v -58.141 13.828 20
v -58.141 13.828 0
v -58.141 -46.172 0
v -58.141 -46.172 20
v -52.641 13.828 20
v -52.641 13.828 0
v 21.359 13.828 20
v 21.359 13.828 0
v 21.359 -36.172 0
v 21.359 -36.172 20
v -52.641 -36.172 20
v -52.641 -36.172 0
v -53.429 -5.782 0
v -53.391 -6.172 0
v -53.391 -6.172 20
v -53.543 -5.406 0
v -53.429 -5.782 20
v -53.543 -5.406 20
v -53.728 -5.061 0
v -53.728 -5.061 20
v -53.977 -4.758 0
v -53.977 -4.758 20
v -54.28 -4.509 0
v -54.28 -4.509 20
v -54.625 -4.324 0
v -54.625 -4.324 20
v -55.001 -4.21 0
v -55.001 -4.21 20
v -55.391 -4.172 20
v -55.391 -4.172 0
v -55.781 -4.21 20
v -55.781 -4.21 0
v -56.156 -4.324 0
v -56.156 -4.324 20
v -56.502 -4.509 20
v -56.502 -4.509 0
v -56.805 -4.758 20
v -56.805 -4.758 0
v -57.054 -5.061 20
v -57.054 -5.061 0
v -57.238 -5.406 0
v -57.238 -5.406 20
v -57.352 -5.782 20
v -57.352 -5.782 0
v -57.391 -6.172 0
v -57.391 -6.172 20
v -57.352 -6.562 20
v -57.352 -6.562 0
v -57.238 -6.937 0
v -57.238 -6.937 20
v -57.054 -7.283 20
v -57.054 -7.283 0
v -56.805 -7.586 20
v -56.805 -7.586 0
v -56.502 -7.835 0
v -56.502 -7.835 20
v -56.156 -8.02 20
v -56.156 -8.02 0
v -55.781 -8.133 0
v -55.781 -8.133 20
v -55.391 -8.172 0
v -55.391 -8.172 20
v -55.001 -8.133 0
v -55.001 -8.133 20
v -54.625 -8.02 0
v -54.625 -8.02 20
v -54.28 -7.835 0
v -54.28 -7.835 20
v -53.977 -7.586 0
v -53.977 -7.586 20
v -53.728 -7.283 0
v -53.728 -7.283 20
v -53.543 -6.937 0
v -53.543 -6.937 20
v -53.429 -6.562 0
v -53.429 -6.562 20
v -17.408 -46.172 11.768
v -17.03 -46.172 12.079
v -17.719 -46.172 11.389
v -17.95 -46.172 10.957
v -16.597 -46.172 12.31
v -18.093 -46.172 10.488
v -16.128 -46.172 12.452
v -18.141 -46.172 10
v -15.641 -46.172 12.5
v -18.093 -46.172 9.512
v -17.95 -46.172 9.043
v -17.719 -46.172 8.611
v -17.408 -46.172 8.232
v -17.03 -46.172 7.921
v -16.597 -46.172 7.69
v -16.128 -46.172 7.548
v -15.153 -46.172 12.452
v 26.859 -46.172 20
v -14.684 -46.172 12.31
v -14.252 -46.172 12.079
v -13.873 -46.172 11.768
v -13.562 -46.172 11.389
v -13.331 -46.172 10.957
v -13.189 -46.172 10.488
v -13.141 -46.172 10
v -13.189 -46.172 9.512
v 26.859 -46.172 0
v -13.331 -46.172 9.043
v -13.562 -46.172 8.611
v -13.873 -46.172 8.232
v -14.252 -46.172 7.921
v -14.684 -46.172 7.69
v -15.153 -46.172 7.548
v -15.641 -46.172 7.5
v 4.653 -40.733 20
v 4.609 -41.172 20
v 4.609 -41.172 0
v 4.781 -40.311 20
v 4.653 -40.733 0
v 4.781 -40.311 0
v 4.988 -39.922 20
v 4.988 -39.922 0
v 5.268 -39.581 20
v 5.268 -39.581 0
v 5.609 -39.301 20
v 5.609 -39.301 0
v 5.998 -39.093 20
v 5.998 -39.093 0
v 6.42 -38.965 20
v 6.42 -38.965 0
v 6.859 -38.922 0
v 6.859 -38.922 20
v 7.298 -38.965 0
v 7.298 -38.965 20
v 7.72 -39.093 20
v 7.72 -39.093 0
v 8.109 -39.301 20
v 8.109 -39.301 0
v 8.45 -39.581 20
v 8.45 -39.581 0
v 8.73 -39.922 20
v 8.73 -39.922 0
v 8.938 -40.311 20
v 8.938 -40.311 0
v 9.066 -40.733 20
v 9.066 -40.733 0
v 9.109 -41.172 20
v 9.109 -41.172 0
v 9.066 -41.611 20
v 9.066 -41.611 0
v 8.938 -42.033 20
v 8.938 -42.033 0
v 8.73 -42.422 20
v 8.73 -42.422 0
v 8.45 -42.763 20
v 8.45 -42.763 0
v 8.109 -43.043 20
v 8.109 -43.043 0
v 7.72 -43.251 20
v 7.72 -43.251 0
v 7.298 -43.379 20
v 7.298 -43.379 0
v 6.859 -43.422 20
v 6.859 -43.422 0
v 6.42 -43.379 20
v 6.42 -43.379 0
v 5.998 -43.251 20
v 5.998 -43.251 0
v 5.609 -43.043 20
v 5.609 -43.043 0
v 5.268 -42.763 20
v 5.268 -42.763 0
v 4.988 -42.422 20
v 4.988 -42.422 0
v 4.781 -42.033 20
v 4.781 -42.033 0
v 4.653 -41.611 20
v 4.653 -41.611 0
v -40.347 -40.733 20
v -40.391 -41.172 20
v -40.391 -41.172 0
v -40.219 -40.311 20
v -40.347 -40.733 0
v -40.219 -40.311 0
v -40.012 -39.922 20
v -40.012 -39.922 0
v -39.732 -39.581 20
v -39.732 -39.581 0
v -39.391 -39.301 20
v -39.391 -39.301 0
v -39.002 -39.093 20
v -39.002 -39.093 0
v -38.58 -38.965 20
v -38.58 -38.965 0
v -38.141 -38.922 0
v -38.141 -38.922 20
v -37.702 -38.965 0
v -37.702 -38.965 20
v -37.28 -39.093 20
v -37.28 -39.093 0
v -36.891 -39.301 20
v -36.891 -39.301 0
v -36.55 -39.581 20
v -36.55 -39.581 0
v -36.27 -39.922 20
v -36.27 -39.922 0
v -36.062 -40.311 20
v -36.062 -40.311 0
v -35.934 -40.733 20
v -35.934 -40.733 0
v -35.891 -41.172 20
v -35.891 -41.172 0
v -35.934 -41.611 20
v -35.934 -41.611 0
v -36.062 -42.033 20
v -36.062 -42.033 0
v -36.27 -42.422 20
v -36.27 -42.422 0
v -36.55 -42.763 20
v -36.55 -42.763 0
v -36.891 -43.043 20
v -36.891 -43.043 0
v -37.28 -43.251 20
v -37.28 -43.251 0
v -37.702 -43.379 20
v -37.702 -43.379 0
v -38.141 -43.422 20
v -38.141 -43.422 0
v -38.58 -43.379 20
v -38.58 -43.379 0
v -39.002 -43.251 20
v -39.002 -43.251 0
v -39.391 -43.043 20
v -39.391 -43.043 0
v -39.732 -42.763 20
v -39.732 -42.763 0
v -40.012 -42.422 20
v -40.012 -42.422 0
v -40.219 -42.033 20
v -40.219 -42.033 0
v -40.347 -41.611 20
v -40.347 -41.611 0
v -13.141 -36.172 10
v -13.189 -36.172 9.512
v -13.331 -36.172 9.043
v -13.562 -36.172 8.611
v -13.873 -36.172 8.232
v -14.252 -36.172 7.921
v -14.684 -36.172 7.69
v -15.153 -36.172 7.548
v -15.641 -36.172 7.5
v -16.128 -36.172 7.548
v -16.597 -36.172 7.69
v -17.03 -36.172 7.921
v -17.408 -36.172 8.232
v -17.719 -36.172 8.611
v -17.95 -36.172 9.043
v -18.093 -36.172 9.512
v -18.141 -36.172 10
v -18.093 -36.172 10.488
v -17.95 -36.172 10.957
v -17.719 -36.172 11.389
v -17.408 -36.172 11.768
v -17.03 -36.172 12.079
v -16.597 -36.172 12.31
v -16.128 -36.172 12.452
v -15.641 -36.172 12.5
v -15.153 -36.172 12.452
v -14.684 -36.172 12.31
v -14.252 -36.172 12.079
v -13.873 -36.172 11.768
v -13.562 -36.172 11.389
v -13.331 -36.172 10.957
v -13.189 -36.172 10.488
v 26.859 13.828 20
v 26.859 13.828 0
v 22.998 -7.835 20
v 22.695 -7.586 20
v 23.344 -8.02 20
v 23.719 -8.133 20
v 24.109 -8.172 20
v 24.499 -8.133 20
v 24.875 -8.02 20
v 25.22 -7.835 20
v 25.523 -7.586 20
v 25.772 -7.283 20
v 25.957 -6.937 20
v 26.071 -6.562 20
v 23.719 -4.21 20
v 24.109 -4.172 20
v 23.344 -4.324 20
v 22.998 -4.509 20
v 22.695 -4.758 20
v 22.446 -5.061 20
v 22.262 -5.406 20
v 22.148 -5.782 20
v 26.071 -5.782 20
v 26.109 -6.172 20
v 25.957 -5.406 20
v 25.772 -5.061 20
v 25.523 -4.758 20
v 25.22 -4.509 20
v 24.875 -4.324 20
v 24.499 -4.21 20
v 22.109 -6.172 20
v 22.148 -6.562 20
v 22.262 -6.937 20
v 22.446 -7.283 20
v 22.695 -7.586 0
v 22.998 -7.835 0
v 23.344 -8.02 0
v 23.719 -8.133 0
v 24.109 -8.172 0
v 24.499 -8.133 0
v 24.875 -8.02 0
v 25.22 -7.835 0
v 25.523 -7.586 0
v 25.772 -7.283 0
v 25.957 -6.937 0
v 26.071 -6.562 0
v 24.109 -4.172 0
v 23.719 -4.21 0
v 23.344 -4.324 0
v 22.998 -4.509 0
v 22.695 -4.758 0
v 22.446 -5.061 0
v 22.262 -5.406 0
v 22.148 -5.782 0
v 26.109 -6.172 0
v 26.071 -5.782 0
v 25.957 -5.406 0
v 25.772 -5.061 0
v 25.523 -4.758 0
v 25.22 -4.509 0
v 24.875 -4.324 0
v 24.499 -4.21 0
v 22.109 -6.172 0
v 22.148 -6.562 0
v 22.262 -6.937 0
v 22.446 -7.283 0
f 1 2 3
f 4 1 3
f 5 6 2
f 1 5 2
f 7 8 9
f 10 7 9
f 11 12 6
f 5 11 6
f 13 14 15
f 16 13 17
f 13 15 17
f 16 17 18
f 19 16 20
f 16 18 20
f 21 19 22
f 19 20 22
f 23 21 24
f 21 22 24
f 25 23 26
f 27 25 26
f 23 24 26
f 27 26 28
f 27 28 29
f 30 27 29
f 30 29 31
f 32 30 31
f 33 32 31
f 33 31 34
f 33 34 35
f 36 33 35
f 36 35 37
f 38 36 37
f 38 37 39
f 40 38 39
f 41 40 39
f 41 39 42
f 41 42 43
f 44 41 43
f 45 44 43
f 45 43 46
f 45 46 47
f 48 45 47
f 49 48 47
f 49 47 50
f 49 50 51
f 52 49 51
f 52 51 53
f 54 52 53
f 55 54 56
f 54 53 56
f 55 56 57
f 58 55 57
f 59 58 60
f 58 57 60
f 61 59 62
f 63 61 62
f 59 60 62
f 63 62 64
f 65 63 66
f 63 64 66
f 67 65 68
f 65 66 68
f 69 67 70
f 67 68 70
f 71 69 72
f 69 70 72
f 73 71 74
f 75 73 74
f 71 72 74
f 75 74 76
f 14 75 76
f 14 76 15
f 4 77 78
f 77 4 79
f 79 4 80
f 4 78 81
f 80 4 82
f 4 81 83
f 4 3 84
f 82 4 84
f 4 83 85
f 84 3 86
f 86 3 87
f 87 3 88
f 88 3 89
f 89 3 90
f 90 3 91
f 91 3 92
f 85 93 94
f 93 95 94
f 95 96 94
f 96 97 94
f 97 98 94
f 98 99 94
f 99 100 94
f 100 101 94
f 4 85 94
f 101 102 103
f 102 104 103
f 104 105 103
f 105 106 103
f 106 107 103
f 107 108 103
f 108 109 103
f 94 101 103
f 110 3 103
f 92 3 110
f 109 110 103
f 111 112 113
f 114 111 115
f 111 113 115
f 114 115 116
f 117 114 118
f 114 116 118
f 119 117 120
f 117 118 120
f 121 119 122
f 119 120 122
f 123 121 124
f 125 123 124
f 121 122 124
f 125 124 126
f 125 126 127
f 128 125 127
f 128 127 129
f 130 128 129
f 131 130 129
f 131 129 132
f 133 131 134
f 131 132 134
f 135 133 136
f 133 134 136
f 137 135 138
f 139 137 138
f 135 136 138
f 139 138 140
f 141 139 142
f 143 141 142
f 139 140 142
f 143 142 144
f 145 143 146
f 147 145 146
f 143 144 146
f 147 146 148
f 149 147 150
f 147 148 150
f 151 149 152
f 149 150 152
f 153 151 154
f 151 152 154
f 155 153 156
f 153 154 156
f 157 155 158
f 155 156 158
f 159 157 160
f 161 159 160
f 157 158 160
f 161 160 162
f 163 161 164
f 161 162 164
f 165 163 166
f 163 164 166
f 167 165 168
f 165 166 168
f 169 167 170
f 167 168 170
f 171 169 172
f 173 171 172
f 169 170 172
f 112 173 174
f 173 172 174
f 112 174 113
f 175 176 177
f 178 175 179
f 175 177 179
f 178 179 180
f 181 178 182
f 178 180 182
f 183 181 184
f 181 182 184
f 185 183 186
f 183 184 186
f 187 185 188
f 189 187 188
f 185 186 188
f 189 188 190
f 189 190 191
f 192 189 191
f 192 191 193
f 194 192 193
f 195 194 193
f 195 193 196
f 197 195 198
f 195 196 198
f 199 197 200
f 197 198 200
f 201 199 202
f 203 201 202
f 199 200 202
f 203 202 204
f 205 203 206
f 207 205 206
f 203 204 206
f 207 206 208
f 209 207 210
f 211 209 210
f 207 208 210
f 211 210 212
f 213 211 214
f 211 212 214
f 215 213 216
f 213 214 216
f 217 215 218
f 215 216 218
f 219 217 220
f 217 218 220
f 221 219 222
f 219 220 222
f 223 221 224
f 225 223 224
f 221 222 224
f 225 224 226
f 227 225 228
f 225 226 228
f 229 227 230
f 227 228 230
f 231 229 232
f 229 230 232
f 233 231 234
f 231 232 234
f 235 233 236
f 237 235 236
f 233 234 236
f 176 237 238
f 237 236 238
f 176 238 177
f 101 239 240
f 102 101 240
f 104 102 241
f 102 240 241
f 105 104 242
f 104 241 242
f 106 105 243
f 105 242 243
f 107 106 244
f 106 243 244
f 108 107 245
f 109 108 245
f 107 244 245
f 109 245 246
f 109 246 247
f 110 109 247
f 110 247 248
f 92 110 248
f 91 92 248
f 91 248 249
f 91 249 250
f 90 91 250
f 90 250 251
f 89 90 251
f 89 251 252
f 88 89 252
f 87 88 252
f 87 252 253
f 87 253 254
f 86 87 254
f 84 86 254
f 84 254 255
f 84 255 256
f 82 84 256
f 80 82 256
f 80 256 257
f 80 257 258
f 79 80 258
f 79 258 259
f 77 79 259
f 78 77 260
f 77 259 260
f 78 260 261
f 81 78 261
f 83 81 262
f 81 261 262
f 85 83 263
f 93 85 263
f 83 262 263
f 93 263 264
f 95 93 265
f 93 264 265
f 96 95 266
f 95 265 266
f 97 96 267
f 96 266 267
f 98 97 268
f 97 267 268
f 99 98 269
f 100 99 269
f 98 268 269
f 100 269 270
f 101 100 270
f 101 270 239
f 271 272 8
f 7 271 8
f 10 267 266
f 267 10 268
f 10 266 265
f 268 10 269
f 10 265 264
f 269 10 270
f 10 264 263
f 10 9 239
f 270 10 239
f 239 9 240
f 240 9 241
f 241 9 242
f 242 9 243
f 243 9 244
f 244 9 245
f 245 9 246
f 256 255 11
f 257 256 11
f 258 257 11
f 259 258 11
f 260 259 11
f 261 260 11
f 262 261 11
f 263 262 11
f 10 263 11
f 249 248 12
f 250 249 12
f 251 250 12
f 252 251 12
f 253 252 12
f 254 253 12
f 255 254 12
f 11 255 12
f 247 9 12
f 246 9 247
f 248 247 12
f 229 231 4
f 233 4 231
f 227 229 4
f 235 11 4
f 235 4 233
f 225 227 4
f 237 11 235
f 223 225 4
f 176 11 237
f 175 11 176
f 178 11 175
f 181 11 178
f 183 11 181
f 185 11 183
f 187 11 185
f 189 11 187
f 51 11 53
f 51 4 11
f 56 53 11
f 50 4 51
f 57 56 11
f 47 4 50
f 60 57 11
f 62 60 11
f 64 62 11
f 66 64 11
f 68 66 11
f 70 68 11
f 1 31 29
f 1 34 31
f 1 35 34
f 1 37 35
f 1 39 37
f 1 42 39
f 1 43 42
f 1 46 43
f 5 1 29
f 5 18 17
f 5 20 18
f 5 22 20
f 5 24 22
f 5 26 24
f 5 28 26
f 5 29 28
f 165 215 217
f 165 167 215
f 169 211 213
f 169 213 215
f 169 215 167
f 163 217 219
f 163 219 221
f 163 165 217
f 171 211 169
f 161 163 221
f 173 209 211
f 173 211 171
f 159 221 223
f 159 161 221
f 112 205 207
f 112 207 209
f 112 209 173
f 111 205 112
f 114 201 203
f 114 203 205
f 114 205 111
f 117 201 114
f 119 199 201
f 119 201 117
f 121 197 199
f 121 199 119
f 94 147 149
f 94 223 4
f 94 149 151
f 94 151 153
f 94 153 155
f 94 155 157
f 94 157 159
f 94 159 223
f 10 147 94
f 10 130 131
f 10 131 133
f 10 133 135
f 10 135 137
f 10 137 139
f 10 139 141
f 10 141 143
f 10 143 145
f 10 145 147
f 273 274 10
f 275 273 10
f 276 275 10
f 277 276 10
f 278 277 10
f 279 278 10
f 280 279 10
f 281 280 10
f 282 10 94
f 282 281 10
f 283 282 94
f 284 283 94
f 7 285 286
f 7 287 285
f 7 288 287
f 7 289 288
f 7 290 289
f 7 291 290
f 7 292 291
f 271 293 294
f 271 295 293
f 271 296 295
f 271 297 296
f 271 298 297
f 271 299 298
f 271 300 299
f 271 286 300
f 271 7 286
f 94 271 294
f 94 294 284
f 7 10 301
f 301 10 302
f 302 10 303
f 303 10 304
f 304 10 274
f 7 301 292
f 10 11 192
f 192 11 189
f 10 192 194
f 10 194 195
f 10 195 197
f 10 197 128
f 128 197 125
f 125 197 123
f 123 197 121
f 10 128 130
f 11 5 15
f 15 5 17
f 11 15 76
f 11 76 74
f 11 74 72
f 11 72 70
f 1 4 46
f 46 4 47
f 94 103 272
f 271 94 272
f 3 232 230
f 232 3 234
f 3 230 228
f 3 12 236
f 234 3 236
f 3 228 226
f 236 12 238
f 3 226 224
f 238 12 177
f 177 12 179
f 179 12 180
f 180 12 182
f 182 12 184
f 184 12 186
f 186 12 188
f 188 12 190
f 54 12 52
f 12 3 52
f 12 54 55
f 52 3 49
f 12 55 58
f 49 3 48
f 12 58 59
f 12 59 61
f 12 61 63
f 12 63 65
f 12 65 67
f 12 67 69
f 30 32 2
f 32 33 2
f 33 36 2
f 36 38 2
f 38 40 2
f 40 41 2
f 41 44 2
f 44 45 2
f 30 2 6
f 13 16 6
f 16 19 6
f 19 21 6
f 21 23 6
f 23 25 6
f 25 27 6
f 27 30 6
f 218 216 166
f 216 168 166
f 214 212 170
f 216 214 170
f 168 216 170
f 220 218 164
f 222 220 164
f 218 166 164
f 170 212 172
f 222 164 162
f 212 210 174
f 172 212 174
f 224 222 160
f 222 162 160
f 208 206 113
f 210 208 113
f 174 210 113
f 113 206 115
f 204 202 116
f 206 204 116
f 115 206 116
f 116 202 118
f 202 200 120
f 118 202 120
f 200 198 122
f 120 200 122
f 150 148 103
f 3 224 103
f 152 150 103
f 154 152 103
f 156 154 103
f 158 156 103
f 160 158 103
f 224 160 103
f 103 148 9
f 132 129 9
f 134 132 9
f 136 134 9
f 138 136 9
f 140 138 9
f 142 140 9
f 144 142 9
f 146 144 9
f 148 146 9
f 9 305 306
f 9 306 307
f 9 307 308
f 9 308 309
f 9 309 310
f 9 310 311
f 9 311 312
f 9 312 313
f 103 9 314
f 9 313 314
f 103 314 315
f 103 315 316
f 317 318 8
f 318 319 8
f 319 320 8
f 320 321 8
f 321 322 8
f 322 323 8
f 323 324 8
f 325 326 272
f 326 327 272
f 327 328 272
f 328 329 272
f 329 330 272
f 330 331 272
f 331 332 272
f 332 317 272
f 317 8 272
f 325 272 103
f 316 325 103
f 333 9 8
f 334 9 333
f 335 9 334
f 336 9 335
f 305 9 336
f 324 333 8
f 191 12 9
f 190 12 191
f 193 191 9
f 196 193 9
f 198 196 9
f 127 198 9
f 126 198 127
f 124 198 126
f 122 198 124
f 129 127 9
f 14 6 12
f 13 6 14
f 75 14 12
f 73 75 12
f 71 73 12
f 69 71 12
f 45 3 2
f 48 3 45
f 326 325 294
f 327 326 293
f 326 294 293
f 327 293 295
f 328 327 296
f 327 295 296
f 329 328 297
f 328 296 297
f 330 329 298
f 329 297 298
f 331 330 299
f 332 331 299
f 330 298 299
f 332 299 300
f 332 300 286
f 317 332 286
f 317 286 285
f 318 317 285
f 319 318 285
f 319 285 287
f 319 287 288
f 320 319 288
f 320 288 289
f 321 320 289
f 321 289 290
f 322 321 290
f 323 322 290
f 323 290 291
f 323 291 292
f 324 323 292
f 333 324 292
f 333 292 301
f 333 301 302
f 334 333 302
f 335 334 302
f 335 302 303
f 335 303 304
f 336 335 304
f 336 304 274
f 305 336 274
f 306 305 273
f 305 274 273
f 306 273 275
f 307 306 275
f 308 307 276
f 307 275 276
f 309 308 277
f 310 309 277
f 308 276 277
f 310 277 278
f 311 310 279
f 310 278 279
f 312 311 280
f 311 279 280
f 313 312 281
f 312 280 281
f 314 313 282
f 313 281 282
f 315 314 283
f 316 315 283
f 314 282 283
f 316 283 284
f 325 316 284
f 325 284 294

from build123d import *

# Parameters (mm, degrees)
BOSS_EXTRUDE1_DEPTH = 20
SKETCH2_R           = 2.25
CUT_EXTRUDE1_DEPTH  = 20
CUT_EXTRUDE2_REACH  = 22
SKETCH3_R           = 2
CUT_EXTRUDE3_REACH  = 12
SKETCH4_R           = 2.5


with BuildPart() as part:
    # Sketch1 → Boss-Extrude1 (new body)
    with BuildSketch(Plane.XY):
        Polygon((-58.140719223, -46.171804232), (26.859280777, -46.171804232), (26.859280777, 13.828195768), (21.359280777, 13.828195768), (21.359280777, -36.171804232), (-52.640719223, -36.171804232), (-52.640719223, 13.828195768), (-58.140719223, 13.828195768), align=None)
    extrude(amount=BOSS_EXTRUDE1_DEPTH)

    # Sketch2 → Cut-Extrude1 (cut)
    with BuildSketch(Plane(origin=(0, 0, 0), x_dir=(-1, 0, 0), z_dir=(0, 0, -1))):
        with Locations((-6.859280777, -41.171804232)):
            Circle(SKETCH2_R)
        with Locations((38.140719223, -41.171804232)):
            Circle(SKETCH2_R)
    extrude(amount=-CUT_EXTRUDE1_DEPTH, mode=Mode.SUBTRACT)

    # Sketch3 → Cut-Extrude2 (cut, up to next)
    with BuildSketch(Plane.XY.offset(20), mode=Mode.PRIVATE) as cut_extrude2_sk1:
        with Locations((-55.390719223, -6.171804232)):
            Circle(SKETCH3_R)
    cut_extrude2_tool1 = extrude(cut_extrude2_sk1.sketch, amount=-CUT_EXTRUDE2_REACH, mode=Mode.PRIVATE) & part.part
    add(cut_extrude2_tool1.solids().sort_by_distance((-55.390719, -6.171804, 20))[0], mode=Mode.SUBTRACT)
    # Sketch3 → Cut-Extrude2 (cut, up to next)
    with BuildSketch(Plane.XY.offset(20), mode=Mode.PRIVATE) as cut_extrude2_sk2:
        with Locations((24.109280777, -6.171804232)):
            Circle(SKETCH3_R)
    cut_extrude2_tool2 = extrude(cut_extrude2_sk2.sketch, amount=-CUT_EXTRUDE2_REACH, mode=Mode.PRIVATE) & part.part
    add(cut_extrude2_tool2.solids().sort_by_distance((24.109281, -6.171804, 20))[0], mode=Mode.SUBTRACT)

    # Sketch4 → Cut-Extrude3 (cut, up to next)
    with BuildSketch(Plane(origin=(0, -36.171804232, 0), x_dir=(1, 0, 0), z_dir=(0, 1, 0)), mode=Mode.PRIVATE) as cut_extrude3_sk1:
        with Locations((-15.640719223, -10)):
            Circle(SKETCH4_R)
    cut_extrude3_tool1 = extrude(cut_extrude3_sk1.sketch, amount=-CUT_EXTRUDE3_REACH, mode=Mode.PRIVATE) & part.part
    add(cut_extrude3_tool1.solids().sort_by_distance((-15.640719, -36.171804, 10))[0], mode=Mode.SUBTRACT)


solid = part.part
